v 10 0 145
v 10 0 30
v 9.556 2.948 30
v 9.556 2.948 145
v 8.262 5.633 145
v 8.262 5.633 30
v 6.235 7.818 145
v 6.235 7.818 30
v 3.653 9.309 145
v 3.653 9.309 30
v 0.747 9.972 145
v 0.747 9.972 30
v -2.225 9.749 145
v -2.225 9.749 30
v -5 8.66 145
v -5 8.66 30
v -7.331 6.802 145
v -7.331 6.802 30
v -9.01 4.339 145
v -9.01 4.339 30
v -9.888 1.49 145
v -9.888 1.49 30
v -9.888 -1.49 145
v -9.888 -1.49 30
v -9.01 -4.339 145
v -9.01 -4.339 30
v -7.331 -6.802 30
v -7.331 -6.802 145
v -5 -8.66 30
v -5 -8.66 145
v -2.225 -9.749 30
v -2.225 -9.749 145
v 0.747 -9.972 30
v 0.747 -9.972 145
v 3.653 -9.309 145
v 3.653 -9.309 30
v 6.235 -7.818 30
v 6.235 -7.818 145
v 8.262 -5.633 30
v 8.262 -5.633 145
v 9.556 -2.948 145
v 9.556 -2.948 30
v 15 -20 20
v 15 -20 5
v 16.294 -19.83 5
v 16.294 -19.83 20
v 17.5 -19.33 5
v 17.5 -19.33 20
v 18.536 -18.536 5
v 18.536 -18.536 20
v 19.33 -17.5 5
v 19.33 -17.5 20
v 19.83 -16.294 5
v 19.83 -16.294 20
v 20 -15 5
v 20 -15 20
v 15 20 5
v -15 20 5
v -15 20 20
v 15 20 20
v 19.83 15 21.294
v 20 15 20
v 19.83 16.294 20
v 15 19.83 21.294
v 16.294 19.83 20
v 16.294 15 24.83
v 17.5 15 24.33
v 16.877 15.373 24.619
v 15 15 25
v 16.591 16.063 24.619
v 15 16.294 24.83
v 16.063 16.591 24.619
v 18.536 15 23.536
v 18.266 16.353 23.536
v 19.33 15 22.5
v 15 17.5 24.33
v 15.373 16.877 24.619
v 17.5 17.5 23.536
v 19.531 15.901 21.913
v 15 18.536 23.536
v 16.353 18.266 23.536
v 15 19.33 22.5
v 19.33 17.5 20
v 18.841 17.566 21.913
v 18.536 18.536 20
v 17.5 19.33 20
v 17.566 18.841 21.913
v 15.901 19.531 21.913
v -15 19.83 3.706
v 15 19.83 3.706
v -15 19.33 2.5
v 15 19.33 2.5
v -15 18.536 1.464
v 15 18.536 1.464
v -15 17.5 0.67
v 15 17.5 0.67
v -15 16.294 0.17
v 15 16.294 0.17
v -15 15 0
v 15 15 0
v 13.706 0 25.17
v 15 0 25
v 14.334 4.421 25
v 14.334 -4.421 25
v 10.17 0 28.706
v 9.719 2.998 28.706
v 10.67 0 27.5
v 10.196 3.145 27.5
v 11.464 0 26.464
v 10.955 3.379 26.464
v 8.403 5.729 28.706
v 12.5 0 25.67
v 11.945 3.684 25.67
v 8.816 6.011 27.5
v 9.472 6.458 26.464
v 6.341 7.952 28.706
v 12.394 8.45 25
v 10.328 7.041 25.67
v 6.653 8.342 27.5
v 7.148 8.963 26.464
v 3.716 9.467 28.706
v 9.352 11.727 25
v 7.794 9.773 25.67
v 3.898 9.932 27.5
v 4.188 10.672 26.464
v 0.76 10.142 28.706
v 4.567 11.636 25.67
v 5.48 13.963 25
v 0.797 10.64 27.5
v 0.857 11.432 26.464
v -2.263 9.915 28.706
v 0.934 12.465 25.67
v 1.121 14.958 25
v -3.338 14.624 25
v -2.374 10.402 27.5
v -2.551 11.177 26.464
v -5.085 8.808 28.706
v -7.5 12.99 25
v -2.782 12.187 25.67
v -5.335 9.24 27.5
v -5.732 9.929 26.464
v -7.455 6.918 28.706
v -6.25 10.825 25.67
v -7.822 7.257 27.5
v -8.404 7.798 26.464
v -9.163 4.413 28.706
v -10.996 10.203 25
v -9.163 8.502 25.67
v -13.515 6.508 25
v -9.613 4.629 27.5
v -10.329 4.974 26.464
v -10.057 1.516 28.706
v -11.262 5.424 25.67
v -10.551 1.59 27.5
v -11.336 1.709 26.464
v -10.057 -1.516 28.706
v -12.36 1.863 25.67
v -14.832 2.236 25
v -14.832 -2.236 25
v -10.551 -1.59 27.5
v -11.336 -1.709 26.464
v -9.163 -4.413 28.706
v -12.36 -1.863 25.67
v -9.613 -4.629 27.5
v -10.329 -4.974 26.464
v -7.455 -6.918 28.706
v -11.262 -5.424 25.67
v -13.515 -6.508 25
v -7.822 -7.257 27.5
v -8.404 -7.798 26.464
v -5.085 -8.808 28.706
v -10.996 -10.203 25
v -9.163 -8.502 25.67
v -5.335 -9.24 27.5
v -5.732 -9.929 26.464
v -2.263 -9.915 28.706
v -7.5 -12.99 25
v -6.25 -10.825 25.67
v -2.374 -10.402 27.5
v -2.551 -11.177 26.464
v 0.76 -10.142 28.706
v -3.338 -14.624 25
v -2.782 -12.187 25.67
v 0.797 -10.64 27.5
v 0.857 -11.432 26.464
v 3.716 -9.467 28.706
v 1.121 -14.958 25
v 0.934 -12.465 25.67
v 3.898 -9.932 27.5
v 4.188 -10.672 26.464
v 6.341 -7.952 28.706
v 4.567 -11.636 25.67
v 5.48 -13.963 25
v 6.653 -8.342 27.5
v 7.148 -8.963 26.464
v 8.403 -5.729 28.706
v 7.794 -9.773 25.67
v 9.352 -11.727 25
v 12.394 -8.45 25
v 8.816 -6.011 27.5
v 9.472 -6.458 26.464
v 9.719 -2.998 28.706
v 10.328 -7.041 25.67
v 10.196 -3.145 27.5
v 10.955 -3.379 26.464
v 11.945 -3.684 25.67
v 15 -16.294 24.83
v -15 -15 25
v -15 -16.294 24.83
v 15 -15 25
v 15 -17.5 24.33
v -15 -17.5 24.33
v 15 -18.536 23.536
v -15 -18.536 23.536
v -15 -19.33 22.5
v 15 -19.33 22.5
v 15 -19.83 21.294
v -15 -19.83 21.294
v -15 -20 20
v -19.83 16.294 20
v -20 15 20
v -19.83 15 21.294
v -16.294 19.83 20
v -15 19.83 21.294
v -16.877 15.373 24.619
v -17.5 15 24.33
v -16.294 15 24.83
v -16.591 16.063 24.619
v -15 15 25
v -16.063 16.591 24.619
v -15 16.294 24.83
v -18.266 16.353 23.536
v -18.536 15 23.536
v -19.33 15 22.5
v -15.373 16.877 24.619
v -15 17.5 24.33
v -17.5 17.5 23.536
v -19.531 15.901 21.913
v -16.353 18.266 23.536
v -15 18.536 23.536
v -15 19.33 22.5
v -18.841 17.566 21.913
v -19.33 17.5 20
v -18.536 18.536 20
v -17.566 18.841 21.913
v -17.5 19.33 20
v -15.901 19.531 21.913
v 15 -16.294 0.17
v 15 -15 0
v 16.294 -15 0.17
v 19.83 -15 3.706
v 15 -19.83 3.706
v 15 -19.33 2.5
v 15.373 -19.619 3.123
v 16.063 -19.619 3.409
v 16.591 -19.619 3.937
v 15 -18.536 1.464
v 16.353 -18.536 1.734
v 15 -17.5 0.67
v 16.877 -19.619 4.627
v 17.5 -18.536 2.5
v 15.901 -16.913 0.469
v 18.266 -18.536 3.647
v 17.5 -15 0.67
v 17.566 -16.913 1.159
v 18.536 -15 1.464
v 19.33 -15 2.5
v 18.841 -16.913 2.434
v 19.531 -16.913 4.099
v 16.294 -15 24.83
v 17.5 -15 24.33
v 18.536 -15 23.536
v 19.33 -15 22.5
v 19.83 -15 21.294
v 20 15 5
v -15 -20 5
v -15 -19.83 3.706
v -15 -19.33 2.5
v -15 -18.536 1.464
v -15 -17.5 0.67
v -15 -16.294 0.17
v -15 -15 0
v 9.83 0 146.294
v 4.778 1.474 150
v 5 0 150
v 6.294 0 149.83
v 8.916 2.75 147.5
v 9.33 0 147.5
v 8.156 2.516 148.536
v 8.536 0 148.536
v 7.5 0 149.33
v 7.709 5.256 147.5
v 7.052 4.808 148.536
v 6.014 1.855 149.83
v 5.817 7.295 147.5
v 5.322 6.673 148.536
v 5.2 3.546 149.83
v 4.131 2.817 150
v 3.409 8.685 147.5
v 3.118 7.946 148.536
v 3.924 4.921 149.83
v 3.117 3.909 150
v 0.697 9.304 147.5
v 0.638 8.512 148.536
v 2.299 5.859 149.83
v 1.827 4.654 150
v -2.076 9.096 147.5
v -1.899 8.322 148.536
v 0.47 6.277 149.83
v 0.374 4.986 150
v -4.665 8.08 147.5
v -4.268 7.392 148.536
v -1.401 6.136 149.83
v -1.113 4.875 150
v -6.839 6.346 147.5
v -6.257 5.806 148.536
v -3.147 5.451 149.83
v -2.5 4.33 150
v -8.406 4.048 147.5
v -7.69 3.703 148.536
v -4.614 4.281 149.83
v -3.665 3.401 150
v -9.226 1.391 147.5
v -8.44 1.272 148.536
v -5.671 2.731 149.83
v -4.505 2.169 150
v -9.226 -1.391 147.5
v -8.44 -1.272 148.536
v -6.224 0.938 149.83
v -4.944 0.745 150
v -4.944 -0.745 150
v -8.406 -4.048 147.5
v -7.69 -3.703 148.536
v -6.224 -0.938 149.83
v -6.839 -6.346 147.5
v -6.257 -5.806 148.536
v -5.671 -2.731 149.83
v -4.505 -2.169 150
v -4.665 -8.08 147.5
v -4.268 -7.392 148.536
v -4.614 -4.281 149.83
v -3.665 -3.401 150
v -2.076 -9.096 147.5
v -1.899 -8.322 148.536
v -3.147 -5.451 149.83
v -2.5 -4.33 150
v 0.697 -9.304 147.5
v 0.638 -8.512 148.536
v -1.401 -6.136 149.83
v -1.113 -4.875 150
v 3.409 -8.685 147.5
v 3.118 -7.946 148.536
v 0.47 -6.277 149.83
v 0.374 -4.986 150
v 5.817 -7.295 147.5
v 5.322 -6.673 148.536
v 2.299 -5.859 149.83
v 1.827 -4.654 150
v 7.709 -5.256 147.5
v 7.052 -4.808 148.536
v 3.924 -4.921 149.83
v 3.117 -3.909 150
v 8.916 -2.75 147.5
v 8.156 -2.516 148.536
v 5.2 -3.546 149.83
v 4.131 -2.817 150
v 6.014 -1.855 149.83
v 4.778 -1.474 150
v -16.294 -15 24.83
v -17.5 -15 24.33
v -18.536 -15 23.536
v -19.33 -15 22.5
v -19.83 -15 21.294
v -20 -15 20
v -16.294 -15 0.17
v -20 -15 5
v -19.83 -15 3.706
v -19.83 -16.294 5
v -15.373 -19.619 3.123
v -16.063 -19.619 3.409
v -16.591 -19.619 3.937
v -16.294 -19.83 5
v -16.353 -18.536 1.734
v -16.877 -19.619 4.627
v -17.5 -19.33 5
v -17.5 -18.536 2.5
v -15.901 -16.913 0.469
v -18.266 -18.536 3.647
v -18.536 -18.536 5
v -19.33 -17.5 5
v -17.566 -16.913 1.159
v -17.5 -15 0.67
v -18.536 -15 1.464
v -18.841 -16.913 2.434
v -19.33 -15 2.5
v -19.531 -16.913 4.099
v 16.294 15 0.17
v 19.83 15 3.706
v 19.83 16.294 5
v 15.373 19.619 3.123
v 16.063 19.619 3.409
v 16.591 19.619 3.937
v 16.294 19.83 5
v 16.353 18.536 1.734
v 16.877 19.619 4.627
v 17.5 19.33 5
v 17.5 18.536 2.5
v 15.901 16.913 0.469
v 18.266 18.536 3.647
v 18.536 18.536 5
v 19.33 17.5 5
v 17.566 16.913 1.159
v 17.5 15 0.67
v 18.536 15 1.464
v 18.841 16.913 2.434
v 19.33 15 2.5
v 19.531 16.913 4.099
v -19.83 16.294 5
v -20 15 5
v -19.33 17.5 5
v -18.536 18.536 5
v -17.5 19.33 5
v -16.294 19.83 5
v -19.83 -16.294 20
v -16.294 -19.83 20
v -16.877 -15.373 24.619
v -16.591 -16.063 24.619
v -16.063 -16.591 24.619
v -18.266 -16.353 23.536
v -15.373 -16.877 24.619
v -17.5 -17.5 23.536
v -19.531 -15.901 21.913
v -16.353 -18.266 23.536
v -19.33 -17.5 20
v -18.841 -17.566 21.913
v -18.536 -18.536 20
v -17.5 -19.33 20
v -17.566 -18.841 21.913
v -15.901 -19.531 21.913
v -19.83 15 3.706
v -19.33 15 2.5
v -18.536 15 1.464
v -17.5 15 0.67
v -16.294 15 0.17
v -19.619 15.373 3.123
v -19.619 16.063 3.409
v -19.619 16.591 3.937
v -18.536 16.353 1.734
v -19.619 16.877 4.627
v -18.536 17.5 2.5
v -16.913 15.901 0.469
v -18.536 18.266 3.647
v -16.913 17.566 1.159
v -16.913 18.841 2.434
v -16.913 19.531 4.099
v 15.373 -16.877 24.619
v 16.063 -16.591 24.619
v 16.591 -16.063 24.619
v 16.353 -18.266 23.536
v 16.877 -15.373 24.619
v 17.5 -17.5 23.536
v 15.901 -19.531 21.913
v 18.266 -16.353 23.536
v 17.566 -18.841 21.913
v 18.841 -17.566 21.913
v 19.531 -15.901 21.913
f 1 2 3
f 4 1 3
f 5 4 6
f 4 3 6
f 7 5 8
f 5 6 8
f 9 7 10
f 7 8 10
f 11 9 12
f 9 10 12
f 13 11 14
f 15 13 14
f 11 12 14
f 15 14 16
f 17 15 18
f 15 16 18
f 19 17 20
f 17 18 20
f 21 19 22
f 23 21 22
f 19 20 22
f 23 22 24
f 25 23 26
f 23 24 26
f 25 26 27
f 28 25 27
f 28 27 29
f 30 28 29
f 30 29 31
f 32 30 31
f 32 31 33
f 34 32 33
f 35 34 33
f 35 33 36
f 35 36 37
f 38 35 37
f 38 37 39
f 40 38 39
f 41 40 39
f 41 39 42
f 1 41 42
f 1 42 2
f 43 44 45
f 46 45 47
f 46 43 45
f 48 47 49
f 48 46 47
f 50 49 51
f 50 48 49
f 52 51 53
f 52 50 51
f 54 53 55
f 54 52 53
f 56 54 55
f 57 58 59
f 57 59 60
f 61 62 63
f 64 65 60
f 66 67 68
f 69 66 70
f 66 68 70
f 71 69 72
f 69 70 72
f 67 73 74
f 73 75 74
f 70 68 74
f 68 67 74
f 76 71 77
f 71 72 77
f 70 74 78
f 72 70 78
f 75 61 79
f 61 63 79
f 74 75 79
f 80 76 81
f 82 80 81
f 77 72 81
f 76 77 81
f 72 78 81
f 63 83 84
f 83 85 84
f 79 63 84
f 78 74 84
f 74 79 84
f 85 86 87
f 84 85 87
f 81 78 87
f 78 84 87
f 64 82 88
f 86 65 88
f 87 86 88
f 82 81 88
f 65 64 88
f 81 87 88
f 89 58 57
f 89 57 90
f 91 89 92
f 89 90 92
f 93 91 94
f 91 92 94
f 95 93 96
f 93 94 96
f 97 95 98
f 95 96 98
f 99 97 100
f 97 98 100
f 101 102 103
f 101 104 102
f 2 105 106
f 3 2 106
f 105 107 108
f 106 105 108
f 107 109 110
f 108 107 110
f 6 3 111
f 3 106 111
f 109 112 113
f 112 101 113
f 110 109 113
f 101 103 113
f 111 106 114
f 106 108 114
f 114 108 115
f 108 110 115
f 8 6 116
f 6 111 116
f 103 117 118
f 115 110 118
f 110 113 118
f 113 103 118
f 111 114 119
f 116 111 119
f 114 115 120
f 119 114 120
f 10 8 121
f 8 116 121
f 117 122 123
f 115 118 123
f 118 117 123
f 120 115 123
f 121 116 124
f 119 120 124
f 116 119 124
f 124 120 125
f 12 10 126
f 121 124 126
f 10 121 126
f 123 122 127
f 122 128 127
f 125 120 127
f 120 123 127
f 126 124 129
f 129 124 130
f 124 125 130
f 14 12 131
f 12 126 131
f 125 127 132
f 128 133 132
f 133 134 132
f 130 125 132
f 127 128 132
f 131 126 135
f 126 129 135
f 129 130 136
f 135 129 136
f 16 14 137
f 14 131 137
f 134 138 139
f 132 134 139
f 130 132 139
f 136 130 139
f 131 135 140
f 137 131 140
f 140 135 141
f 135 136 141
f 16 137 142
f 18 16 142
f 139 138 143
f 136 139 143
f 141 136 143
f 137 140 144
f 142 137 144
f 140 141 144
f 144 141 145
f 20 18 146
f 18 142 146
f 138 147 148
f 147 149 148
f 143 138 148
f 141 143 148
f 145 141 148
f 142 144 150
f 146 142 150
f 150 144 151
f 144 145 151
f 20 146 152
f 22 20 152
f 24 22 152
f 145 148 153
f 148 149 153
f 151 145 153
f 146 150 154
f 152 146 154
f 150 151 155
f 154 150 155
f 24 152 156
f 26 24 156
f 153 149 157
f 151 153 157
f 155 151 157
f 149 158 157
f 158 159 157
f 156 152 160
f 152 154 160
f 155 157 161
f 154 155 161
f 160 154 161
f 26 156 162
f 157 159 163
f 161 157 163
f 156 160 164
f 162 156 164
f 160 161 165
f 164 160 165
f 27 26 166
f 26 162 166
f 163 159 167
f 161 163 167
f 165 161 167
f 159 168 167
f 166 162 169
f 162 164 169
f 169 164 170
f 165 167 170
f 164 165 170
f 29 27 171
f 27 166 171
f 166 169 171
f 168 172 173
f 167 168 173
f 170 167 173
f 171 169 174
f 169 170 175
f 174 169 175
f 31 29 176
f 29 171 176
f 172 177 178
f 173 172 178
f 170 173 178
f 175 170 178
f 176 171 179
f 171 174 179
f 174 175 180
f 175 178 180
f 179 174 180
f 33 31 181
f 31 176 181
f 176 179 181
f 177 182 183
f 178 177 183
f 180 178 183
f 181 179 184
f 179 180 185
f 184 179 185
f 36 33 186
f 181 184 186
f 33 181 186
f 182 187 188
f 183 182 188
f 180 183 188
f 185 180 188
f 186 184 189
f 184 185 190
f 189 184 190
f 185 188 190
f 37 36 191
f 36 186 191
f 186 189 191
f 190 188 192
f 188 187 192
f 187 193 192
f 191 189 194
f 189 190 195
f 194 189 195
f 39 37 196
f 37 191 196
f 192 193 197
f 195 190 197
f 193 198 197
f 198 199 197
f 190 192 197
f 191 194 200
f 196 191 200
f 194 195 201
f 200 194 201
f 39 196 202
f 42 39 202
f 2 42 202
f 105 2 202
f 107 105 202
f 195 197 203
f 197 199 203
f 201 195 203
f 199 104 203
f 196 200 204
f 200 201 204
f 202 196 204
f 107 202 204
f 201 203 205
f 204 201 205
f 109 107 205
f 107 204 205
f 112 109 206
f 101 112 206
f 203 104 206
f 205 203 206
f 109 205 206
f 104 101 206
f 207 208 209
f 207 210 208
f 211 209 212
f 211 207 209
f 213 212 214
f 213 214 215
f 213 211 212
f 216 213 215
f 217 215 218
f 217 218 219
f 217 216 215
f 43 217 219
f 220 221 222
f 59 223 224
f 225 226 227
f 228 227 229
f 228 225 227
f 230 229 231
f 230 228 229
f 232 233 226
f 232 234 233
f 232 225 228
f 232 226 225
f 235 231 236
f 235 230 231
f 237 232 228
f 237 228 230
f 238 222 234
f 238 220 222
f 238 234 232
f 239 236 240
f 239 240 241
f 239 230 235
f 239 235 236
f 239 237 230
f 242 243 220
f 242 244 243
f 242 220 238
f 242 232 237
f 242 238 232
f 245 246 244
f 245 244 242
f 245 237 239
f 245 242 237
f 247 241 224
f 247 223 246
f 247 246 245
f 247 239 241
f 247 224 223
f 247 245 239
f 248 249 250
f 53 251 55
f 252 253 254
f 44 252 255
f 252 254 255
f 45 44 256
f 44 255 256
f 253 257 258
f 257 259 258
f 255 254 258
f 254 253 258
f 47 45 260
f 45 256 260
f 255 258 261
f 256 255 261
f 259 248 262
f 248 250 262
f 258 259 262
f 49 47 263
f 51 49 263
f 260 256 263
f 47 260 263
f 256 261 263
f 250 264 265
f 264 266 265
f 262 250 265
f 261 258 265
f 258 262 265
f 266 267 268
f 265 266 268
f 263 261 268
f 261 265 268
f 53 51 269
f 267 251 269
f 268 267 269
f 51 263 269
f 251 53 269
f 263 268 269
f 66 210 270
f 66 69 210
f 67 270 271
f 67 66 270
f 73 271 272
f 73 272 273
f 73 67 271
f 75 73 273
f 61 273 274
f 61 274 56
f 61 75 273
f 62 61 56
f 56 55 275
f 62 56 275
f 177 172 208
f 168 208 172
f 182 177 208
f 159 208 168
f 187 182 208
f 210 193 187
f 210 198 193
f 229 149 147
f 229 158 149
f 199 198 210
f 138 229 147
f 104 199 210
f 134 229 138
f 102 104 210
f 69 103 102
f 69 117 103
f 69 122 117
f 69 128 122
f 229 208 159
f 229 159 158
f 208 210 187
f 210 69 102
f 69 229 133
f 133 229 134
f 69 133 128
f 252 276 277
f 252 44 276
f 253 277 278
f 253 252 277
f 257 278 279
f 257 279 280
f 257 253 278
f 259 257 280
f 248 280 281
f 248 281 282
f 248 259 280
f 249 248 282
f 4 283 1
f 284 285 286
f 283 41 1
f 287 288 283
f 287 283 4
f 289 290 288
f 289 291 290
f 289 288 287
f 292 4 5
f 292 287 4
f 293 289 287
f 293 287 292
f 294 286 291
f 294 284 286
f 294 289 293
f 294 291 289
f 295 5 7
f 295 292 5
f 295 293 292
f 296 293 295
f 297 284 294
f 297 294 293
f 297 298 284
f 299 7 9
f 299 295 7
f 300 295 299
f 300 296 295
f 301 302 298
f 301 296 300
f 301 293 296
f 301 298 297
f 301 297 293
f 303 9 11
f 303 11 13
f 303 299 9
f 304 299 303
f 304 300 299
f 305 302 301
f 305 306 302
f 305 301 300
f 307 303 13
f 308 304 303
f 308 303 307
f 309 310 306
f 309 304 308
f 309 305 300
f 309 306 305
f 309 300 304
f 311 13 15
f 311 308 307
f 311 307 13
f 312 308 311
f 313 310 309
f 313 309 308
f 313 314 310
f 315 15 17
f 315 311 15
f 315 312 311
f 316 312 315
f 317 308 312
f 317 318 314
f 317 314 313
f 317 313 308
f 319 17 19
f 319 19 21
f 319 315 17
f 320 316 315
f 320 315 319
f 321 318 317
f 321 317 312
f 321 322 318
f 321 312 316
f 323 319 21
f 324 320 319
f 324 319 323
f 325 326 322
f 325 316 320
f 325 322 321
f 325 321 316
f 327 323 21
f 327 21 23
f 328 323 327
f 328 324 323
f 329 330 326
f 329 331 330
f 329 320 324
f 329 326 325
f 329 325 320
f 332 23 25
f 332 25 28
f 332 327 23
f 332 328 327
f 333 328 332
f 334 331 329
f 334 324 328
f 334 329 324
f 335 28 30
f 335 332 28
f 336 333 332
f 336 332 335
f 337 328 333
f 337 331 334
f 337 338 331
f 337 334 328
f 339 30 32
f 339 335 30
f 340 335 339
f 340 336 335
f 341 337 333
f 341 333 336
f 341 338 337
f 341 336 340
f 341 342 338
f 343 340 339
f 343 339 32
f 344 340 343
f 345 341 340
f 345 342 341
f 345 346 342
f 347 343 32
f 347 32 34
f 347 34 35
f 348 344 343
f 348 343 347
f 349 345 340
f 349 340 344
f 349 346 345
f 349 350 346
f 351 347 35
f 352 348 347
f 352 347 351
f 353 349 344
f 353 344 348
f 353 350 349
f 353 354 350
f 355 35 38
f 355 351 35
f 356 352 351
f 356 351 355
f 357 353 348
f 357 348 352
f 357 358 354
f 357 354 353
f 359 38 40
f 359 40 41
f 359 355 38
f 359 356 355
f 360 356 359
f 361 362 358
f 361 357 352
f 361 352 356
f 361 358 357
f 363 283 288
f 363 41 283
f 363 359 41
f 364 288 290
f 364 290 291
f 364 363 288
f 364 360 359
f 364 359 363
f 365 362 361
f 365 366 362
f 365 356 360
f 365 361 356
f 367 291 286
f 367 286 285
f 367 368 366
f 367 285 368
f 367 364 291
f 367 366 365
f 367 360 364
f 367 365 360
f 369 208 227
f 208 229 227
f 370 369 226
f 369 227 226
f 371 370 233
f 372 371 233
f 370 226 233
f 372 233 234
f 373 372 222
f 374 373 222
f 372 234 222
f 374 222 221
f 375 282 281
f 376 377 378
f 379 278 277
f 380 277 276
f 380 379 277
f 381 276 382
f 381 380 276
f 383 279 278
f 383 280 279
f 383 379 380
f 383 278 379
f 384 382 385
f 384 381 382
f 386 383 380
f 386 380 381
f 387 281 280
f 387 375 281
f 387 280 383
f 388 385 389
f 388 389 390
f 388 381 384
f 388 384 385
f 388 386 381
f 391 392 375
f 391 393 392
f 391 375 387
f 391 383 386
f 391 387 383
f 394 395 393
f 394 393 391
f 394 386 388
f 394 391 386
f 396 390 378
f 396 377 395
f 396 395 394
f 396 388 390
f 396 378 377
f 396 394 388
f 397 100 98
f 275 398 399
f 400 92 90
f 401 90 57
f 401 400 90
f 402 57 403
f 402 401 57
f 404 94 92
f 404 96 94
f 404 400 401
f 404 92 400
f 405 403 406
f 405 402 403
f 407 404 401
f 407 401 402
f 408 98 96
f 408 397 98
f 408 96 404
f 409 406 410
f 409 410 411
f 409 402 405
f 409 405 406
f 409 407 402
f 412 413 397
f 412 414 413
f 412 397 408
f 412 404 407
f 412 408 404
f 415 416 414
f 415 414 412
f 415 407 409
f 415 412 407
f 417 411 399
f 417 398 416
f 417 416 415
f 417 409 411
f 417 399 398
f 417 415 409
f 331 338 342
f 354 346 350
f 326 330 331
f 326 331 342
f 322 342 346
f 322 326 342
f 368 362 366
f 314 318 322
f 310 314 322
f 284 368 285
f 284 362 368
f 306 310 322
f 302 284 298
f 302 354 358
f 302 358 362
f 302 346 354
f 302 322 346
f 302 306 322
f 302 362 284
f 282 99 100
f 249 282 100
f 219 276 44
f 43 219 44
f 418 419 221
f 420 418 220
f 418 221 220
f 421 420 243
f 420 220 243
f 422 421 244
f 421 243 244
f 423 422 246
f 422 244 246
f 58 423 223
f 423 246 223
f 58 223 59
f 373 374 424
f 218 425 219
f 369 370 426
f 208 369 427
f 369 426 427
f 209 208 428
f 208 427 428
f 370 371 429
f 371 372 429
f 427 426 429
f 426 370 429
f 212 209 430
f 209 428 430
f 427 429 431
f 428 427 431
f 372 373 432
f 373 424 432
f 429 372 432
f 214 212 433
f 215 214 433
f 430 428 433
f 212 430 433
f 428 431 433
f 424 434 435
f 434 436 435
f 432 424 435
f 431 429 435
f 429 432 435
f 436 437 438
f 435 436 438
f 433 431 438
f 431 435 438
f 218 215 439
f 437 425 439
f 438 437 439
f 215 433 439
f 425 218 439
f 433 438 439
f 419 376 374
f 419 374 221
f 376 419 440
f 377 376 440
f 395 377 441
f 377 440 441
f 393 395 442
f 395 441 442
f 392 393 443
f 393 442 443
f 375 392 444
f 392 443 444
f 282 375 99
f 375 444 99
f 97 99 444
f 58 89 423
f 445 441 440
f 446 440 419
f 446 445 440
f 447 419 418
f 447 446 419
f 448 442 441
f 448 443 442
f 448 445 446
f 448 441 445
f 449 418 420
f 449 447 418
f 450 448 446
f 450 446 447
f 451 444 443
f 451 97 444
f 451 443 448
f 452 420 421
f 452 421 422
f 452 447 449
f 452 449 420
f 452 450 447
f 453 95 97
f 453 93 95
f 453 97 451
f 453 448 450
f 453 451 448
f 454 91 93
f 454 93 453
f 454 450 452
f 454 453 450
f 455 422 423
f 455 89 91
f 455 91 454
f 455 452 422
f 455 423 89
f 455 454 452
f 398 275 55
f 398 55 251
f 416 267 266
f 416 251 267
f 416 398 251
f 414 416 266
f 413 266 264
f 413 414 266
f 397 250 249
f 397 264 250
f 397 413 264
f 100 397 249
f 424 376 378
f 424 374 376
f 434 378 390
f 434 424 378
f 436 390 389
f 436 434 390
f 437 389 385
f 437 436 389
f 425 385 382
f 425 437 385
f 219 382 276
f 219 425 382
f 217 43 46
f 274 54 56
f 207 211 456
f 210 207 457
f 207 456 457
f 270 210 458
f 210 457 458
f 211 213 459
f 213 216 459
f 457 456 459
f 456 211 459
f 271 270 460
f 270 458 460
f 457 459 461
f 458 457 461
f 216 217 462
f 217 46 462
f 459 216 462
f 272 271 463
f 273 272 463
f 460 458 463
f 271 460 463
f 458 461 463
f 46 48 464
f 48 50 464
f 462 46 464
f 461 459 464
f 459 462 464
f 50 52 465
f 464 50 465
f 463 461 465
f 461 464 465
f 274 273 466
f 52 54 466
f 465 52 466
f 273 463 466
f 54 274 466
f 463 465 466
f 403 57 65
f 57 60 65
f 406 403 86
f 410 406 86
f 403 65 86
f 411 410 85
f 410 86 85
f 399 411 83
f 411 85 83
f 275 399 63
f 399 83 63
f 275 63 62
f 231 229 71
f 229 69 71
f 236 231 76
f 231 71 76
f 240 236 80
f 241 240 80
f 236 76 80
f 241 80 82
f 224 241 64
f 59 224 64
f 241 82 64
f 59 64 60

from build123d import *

# Parameters (mm, degrees)
F0_W     = 40
F0_H     = 40
F0_R     = 10
F1_DEPTH = 25
F2_DEPTH = 150
F3_R     = 4.99999


# Not quite as in the source:
# - a fillet or chamfer is up to 0.001 mm smaller than in the source, because OpenCascade refuses the exact size


with BuildPart() as f1:
    # F0 (on Top) → F1 (new body)
    with BuildSketch(Plane.XY):
        Rectangle(F0_W, F0_H)
        Circle(F0_R, mode=Mode.SUBTRACT)
    extrude(amount=F1_DEPTH)

    # F0 (on Top) → F2 (join)
    with BuildSketch(Plane.XY):
        Circle(F0_R)
    extrude(amount=F2_DEPTH)

    # F3 (radius 5 in the source; OpenCascade refuses exactly that, so slightly less here)
    f3_edges = [f1.edges().sort_by_distance(p)[0] for p in [
        (20, 0, 0),
        (0, 20, 0),
        (-20, 0, 0),
        (0, -20, 0),
        (-20, 20, 12.5),
        (-20, -20, 12.5),
        (-20, 0, 25),
        (20, -20, 12.5),
        (0, -20, 25),
        (-10, 0, 25),
        (10, 0, 87.5),
        (-10, 0, 150),
        (20, 20, 12.5),
        (20, 0, 25),
        (0, 20, 25),
    ]]
    fillet(f3_edges, radius=F3_R)


solid = f1.part
